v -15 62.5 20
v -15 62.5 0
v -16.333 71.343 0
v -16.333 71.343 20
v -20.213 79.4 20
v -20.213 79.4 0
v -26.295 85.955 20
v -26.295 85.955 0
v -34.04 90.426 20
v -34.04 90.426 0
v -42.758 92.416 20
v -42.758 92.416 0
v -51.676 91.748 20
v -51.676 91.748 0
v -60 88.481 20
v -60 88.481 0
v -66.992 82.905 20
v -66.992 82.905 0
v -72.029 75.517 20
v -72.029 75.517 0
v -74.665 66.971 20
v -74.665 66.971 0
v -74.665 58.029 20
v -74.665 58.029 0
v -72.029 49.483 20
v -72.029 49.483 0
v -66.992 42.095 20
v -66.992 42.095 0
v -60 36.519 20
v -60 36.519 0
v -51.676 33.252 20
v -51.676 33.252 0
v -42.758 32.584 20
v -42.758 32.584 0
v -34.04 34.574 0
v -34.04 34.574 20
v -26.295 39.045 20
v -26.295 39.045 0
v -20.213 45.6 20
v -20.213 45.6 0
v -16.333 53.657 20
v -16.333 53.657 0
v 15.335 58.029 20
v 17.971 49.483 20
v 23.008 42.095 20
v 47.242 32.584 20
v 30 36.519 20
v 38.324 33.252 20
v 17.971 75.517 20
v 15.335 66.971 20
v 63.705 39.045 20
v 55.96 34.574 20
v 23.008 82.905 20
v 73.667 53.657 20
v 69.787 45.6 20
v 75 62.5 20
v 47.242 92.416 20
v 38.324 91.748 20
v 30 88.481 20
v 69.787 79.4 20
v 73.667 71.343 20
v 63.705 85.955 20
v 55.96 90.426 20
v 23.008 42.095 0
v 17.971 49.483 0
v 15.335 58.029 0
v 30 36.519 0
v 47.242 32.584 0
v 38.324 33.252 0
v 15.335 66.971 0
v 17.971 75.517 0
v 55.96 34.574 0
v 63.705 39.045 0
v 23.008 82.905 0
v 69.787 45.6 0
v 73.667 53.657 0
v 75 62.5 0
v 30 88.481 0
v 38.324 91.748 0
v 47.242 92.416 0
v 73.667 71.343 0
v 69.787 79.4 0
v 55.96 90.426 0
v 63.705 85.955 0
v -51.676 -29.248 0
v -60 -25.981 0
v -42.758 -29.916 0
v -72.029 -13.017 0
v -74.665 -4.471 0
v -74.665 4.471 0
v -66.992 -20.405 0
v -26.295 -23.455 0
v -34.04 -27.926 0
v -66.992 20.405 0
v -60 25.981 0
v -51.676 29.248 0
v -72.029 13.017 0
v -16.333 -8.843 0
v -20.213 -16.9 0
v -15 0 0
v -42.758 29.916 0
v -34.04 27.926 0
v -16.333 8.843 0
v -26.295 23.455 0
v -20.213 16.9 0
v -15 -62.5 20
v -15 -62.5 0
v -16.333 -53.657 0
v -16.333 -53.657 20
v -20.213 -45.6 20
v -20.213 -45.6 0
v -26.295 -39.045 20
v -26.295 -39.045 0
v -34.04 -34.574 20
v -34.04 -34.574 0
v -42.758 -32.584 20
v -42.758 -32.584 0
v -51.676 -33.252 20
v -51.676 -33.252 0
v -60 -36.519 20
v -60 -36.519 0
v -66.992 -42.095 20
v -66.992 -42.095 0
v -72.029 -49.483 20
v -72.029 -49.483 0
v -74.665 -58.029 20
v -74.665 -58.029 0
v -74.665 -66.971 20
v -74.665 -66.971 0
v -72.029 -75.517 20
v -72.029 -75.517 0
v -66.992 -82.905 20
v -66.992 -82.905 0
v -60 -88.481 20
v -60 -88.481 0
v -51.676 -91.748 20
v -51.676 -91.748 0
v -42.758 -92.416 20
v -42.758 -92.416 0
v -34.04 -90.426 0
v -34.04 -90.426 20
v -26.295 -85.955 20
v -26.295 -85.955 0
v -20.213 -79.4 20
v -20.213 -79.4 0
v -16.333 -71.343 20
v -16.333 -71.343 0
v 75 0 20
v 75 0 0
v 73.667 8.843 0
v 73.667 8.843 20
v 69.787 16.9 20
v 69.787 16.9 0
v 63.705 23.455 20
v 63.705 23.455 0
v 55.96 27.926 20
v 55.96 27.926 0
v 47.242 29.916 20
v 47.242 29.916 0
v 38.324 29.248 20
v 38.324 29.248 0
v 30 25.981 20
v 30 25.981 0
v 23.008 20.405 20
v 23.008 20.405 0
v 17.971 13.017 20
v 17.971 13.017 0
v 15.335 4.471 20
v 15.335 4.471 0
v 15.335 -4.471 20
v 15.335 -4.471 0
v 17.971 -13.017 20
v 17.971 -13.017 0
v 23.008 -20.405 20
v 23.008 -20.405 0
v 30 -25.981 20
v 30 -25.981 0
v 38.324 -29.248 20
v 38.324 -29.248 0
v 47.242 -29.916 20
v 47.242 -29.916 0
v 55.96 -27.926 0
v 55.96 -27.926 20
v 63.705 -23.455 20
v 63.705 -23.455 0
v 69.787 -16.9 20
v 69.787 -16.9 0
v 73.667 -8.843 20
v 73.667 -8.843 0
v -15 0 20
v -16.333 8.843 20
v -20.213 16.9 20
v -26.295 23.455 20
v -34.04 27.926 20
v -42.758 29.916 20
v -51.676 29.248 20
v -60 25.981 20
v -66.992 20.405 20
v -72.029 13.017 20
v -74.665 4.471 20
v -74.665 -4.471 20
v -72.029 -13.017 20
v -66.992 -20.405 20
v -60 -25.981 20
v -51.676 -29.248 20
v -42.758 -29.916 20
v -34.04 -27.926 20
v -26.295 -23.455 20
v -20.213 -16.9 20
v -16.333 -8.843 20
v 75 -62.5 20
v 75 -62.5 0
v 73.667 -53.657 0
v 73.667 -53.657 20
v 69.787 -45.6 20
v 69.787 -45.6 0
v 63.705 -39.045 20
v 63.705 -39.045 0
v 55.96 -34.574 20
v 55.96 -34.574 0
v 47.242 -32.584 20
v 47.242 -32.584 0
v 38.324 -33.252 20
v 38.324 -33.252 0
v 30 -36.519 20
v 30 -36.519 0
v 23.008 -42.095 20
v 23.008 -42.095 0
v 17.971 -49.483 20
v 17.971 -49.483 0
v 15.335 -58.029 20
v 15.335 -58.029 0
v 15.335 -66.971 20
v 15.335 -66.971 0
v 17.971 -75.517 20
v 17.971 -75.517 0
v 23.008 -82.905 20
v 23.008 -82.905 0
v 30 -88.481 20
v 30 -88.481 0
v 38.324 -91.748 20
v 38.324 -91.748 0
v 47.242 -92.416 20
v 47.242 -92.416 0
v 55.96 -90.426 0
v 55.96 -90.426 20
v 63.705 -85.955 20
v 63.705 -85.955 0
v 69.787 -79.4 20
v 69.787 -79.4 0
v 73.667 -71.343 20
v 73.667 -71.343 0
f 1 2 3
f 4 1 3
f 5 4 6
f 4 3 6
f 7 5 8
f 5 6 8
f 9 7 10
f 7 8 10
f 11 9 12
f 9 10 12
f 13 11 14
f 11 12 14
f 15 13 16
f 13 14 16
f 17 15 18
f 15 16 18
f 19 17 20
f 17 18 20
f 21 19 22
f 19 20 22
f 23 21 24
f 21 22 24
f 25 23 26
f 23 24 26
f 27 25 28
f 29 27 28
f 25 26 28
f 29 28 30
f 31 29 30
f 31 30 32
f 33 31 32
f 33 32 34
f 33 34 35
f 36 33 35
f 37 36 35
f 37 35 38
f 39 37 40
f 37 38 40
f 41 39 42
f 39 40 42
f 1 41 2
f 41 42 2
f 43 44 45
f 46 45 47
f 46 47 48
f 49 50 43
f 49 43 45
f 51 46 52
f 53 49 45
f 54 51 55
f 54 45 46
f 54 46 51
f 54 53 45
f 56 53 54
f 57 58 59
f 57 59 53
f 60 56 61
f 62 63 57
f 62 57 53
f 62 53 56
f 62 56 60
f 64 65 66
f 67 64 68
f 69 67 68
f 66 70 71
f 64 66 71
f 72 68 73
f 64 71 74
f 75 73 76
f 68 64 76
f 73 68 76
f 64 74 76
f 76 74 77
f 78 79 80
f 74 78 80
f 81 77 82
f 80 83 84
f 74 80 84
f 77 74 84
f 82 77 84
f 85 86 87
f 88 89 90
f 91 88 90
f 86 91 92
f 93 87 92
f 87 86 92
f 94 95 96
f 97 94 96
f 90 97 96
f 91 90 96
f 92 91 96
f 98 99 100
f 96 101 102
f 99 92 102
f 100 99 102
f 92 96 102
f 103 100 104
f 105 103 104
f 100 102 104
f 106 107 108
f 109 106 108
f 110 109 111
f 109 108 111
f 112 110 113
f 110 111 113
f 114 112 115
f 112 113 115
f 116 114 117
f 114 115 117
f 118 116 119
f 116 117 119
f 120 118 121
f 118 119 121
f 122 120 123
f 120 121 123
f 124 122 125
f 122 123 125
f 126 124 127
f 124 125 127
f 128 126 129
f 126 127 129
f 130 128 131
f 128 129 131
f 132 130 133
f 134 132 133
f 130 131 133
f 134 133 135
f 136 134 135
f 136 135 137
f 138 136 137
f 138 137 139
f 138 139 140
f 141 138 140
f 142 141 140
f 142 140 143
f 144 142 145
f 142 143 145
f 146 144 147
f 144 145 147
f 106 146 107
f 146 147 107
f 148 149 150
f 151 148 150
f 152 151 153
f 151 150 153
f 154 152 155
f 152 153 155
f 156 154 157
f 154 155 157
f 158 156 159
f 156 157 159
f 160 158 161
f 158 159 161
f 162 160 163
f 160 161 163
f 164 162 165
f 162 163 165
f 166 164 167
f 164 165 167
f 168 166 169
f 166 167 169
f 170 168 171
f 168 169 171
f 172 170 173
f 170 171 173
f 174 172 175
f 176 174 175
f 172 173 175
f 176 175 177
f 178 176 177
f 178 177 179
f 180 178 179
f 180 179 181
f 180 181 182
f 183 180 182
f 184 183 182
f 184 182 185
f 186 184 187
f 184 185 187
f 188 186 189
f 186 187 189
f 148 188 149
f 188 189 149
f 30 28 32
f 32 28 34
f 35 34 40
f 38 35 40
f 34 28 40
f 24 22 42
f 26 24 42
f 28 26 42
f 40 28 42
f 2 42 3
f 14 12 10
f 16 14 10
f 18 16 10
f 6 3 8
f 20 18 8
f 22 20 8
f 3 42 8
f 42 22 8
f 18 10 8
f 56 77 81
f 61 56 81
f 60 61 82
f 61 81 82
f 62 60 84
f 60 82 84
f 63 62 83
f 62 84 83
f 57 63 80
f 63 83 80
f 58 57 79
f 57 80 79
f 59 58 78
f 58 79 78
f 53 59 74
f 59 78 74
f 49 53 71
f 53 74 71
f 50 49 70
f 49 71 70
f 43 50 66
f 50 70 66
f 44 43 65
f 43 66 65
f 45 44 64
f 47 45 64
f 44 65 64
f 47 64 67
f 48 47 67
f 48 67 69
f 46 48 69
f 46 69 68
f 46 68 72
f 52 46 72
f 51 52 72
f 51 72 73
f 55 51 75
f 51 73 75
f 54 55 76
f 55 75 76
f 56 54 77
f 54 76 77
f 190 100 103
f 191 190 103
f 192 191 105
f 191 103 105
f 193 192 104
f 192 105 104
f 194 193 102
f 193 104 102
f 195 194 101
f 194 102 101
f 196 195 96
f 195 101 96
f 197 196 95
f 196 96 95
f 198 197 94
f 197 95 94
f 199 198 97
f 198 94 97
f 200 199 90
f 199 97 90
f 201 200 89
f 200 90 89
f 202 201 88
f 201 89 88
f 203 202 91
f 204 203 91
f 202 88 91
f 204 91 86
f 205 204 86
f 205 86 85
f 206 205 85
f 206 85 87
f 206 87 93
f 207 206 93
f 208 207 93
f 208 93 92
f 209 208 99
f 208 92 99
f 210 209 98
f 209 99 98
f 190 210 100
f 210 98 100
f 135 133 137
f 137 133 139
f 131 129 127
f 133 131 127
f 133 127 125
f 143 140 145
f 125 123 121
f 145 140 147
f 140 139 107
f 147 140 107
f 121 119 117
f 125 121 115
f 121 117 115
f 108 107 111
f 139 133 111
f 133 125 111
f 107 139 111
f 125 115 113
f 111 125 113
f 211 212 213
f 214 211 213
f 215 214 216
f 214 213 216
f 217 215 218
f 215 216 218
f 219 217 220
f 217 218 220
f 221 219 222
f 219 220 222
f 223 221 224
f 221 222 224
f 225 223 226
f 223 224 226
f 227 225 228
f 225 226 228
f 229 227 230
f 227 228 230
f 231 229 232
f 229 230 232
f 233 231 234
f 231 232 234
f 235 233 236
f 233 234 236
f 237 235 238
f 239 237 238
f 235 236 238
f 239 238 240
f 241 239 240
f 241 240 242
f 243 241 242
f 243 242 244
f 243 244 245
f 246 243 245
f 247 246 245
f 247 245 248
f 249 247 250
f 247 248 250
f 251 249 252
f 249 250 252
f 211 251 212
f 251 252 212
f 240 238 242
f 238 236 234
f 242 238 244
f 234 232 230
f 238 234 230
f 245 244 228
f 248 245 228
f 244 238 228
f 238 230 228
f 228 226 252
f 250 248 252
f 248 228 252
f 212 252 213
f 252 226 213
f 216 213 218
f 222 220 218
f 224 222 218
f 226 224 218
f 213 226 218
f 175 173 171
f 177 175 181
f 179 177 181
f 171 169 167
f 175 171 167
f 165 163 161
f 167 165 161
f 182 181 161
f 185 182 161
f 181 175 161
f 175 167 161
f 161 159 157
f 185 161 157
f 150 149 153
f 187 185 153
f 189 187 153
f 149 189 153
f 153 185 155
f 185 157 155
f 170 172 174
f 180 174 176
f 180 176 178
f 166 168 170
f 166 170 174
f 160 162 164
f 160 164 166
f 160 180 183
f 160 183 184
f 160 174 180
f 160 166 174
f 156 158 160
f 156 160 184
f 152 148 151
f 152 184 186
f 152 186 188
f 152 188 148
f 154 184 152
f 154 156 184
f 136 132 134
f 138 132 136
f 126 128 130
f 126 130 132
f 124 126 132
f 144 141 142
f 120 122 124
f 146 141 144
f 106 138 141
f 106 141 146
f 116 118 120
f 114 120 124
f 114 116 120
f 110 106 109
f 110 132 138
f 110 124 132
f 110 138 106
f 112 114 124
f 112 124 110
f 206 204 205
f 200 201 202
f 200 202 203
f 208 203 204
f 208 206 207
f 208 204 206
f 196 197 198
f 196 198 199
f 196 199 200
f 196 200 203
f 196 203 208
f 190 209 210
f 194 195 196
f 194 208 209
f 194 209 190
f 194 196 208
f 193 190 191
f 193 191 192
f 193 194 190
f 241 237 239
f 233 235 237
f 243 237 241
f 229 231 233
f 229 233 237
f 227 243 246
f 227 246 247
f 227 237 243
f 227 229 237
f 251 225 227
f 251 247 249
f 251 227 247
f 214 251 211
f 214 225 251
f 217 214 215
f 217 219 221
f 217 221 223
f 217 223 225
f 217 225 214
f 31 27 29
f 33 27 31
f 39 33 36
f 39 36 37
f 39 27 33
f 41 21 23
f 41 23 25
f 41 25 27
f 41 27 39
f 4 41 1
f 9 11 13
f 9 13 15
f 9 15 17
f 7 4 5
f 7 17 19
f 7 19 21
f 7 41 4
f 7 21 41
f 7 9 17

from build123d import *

# Parameters (mm, degrees)
F0_R     = 30
F1_DEPTH = 20


with BuildPart() as f1:
    # F0 (on Top) → F1 (new body)
    with BuildSketch(Plane.XY):
        with Locations((-45, 62.5)):
            Circle(F0_R)
        with Locations((-45, 0)):
            Circle(F0_R)
        with Locations((-45, -62.5)):
            Circle(F0_R)
        with Locations((45, 62.5)):
            Circle(F0_R)
        with Locations((45, 0)):
            Circle(F0_R)
        with Locations((45, -62.5)):
            Circle(F0_R)
    extrude(amount=F1_DEPTH)


solid = f1.part
